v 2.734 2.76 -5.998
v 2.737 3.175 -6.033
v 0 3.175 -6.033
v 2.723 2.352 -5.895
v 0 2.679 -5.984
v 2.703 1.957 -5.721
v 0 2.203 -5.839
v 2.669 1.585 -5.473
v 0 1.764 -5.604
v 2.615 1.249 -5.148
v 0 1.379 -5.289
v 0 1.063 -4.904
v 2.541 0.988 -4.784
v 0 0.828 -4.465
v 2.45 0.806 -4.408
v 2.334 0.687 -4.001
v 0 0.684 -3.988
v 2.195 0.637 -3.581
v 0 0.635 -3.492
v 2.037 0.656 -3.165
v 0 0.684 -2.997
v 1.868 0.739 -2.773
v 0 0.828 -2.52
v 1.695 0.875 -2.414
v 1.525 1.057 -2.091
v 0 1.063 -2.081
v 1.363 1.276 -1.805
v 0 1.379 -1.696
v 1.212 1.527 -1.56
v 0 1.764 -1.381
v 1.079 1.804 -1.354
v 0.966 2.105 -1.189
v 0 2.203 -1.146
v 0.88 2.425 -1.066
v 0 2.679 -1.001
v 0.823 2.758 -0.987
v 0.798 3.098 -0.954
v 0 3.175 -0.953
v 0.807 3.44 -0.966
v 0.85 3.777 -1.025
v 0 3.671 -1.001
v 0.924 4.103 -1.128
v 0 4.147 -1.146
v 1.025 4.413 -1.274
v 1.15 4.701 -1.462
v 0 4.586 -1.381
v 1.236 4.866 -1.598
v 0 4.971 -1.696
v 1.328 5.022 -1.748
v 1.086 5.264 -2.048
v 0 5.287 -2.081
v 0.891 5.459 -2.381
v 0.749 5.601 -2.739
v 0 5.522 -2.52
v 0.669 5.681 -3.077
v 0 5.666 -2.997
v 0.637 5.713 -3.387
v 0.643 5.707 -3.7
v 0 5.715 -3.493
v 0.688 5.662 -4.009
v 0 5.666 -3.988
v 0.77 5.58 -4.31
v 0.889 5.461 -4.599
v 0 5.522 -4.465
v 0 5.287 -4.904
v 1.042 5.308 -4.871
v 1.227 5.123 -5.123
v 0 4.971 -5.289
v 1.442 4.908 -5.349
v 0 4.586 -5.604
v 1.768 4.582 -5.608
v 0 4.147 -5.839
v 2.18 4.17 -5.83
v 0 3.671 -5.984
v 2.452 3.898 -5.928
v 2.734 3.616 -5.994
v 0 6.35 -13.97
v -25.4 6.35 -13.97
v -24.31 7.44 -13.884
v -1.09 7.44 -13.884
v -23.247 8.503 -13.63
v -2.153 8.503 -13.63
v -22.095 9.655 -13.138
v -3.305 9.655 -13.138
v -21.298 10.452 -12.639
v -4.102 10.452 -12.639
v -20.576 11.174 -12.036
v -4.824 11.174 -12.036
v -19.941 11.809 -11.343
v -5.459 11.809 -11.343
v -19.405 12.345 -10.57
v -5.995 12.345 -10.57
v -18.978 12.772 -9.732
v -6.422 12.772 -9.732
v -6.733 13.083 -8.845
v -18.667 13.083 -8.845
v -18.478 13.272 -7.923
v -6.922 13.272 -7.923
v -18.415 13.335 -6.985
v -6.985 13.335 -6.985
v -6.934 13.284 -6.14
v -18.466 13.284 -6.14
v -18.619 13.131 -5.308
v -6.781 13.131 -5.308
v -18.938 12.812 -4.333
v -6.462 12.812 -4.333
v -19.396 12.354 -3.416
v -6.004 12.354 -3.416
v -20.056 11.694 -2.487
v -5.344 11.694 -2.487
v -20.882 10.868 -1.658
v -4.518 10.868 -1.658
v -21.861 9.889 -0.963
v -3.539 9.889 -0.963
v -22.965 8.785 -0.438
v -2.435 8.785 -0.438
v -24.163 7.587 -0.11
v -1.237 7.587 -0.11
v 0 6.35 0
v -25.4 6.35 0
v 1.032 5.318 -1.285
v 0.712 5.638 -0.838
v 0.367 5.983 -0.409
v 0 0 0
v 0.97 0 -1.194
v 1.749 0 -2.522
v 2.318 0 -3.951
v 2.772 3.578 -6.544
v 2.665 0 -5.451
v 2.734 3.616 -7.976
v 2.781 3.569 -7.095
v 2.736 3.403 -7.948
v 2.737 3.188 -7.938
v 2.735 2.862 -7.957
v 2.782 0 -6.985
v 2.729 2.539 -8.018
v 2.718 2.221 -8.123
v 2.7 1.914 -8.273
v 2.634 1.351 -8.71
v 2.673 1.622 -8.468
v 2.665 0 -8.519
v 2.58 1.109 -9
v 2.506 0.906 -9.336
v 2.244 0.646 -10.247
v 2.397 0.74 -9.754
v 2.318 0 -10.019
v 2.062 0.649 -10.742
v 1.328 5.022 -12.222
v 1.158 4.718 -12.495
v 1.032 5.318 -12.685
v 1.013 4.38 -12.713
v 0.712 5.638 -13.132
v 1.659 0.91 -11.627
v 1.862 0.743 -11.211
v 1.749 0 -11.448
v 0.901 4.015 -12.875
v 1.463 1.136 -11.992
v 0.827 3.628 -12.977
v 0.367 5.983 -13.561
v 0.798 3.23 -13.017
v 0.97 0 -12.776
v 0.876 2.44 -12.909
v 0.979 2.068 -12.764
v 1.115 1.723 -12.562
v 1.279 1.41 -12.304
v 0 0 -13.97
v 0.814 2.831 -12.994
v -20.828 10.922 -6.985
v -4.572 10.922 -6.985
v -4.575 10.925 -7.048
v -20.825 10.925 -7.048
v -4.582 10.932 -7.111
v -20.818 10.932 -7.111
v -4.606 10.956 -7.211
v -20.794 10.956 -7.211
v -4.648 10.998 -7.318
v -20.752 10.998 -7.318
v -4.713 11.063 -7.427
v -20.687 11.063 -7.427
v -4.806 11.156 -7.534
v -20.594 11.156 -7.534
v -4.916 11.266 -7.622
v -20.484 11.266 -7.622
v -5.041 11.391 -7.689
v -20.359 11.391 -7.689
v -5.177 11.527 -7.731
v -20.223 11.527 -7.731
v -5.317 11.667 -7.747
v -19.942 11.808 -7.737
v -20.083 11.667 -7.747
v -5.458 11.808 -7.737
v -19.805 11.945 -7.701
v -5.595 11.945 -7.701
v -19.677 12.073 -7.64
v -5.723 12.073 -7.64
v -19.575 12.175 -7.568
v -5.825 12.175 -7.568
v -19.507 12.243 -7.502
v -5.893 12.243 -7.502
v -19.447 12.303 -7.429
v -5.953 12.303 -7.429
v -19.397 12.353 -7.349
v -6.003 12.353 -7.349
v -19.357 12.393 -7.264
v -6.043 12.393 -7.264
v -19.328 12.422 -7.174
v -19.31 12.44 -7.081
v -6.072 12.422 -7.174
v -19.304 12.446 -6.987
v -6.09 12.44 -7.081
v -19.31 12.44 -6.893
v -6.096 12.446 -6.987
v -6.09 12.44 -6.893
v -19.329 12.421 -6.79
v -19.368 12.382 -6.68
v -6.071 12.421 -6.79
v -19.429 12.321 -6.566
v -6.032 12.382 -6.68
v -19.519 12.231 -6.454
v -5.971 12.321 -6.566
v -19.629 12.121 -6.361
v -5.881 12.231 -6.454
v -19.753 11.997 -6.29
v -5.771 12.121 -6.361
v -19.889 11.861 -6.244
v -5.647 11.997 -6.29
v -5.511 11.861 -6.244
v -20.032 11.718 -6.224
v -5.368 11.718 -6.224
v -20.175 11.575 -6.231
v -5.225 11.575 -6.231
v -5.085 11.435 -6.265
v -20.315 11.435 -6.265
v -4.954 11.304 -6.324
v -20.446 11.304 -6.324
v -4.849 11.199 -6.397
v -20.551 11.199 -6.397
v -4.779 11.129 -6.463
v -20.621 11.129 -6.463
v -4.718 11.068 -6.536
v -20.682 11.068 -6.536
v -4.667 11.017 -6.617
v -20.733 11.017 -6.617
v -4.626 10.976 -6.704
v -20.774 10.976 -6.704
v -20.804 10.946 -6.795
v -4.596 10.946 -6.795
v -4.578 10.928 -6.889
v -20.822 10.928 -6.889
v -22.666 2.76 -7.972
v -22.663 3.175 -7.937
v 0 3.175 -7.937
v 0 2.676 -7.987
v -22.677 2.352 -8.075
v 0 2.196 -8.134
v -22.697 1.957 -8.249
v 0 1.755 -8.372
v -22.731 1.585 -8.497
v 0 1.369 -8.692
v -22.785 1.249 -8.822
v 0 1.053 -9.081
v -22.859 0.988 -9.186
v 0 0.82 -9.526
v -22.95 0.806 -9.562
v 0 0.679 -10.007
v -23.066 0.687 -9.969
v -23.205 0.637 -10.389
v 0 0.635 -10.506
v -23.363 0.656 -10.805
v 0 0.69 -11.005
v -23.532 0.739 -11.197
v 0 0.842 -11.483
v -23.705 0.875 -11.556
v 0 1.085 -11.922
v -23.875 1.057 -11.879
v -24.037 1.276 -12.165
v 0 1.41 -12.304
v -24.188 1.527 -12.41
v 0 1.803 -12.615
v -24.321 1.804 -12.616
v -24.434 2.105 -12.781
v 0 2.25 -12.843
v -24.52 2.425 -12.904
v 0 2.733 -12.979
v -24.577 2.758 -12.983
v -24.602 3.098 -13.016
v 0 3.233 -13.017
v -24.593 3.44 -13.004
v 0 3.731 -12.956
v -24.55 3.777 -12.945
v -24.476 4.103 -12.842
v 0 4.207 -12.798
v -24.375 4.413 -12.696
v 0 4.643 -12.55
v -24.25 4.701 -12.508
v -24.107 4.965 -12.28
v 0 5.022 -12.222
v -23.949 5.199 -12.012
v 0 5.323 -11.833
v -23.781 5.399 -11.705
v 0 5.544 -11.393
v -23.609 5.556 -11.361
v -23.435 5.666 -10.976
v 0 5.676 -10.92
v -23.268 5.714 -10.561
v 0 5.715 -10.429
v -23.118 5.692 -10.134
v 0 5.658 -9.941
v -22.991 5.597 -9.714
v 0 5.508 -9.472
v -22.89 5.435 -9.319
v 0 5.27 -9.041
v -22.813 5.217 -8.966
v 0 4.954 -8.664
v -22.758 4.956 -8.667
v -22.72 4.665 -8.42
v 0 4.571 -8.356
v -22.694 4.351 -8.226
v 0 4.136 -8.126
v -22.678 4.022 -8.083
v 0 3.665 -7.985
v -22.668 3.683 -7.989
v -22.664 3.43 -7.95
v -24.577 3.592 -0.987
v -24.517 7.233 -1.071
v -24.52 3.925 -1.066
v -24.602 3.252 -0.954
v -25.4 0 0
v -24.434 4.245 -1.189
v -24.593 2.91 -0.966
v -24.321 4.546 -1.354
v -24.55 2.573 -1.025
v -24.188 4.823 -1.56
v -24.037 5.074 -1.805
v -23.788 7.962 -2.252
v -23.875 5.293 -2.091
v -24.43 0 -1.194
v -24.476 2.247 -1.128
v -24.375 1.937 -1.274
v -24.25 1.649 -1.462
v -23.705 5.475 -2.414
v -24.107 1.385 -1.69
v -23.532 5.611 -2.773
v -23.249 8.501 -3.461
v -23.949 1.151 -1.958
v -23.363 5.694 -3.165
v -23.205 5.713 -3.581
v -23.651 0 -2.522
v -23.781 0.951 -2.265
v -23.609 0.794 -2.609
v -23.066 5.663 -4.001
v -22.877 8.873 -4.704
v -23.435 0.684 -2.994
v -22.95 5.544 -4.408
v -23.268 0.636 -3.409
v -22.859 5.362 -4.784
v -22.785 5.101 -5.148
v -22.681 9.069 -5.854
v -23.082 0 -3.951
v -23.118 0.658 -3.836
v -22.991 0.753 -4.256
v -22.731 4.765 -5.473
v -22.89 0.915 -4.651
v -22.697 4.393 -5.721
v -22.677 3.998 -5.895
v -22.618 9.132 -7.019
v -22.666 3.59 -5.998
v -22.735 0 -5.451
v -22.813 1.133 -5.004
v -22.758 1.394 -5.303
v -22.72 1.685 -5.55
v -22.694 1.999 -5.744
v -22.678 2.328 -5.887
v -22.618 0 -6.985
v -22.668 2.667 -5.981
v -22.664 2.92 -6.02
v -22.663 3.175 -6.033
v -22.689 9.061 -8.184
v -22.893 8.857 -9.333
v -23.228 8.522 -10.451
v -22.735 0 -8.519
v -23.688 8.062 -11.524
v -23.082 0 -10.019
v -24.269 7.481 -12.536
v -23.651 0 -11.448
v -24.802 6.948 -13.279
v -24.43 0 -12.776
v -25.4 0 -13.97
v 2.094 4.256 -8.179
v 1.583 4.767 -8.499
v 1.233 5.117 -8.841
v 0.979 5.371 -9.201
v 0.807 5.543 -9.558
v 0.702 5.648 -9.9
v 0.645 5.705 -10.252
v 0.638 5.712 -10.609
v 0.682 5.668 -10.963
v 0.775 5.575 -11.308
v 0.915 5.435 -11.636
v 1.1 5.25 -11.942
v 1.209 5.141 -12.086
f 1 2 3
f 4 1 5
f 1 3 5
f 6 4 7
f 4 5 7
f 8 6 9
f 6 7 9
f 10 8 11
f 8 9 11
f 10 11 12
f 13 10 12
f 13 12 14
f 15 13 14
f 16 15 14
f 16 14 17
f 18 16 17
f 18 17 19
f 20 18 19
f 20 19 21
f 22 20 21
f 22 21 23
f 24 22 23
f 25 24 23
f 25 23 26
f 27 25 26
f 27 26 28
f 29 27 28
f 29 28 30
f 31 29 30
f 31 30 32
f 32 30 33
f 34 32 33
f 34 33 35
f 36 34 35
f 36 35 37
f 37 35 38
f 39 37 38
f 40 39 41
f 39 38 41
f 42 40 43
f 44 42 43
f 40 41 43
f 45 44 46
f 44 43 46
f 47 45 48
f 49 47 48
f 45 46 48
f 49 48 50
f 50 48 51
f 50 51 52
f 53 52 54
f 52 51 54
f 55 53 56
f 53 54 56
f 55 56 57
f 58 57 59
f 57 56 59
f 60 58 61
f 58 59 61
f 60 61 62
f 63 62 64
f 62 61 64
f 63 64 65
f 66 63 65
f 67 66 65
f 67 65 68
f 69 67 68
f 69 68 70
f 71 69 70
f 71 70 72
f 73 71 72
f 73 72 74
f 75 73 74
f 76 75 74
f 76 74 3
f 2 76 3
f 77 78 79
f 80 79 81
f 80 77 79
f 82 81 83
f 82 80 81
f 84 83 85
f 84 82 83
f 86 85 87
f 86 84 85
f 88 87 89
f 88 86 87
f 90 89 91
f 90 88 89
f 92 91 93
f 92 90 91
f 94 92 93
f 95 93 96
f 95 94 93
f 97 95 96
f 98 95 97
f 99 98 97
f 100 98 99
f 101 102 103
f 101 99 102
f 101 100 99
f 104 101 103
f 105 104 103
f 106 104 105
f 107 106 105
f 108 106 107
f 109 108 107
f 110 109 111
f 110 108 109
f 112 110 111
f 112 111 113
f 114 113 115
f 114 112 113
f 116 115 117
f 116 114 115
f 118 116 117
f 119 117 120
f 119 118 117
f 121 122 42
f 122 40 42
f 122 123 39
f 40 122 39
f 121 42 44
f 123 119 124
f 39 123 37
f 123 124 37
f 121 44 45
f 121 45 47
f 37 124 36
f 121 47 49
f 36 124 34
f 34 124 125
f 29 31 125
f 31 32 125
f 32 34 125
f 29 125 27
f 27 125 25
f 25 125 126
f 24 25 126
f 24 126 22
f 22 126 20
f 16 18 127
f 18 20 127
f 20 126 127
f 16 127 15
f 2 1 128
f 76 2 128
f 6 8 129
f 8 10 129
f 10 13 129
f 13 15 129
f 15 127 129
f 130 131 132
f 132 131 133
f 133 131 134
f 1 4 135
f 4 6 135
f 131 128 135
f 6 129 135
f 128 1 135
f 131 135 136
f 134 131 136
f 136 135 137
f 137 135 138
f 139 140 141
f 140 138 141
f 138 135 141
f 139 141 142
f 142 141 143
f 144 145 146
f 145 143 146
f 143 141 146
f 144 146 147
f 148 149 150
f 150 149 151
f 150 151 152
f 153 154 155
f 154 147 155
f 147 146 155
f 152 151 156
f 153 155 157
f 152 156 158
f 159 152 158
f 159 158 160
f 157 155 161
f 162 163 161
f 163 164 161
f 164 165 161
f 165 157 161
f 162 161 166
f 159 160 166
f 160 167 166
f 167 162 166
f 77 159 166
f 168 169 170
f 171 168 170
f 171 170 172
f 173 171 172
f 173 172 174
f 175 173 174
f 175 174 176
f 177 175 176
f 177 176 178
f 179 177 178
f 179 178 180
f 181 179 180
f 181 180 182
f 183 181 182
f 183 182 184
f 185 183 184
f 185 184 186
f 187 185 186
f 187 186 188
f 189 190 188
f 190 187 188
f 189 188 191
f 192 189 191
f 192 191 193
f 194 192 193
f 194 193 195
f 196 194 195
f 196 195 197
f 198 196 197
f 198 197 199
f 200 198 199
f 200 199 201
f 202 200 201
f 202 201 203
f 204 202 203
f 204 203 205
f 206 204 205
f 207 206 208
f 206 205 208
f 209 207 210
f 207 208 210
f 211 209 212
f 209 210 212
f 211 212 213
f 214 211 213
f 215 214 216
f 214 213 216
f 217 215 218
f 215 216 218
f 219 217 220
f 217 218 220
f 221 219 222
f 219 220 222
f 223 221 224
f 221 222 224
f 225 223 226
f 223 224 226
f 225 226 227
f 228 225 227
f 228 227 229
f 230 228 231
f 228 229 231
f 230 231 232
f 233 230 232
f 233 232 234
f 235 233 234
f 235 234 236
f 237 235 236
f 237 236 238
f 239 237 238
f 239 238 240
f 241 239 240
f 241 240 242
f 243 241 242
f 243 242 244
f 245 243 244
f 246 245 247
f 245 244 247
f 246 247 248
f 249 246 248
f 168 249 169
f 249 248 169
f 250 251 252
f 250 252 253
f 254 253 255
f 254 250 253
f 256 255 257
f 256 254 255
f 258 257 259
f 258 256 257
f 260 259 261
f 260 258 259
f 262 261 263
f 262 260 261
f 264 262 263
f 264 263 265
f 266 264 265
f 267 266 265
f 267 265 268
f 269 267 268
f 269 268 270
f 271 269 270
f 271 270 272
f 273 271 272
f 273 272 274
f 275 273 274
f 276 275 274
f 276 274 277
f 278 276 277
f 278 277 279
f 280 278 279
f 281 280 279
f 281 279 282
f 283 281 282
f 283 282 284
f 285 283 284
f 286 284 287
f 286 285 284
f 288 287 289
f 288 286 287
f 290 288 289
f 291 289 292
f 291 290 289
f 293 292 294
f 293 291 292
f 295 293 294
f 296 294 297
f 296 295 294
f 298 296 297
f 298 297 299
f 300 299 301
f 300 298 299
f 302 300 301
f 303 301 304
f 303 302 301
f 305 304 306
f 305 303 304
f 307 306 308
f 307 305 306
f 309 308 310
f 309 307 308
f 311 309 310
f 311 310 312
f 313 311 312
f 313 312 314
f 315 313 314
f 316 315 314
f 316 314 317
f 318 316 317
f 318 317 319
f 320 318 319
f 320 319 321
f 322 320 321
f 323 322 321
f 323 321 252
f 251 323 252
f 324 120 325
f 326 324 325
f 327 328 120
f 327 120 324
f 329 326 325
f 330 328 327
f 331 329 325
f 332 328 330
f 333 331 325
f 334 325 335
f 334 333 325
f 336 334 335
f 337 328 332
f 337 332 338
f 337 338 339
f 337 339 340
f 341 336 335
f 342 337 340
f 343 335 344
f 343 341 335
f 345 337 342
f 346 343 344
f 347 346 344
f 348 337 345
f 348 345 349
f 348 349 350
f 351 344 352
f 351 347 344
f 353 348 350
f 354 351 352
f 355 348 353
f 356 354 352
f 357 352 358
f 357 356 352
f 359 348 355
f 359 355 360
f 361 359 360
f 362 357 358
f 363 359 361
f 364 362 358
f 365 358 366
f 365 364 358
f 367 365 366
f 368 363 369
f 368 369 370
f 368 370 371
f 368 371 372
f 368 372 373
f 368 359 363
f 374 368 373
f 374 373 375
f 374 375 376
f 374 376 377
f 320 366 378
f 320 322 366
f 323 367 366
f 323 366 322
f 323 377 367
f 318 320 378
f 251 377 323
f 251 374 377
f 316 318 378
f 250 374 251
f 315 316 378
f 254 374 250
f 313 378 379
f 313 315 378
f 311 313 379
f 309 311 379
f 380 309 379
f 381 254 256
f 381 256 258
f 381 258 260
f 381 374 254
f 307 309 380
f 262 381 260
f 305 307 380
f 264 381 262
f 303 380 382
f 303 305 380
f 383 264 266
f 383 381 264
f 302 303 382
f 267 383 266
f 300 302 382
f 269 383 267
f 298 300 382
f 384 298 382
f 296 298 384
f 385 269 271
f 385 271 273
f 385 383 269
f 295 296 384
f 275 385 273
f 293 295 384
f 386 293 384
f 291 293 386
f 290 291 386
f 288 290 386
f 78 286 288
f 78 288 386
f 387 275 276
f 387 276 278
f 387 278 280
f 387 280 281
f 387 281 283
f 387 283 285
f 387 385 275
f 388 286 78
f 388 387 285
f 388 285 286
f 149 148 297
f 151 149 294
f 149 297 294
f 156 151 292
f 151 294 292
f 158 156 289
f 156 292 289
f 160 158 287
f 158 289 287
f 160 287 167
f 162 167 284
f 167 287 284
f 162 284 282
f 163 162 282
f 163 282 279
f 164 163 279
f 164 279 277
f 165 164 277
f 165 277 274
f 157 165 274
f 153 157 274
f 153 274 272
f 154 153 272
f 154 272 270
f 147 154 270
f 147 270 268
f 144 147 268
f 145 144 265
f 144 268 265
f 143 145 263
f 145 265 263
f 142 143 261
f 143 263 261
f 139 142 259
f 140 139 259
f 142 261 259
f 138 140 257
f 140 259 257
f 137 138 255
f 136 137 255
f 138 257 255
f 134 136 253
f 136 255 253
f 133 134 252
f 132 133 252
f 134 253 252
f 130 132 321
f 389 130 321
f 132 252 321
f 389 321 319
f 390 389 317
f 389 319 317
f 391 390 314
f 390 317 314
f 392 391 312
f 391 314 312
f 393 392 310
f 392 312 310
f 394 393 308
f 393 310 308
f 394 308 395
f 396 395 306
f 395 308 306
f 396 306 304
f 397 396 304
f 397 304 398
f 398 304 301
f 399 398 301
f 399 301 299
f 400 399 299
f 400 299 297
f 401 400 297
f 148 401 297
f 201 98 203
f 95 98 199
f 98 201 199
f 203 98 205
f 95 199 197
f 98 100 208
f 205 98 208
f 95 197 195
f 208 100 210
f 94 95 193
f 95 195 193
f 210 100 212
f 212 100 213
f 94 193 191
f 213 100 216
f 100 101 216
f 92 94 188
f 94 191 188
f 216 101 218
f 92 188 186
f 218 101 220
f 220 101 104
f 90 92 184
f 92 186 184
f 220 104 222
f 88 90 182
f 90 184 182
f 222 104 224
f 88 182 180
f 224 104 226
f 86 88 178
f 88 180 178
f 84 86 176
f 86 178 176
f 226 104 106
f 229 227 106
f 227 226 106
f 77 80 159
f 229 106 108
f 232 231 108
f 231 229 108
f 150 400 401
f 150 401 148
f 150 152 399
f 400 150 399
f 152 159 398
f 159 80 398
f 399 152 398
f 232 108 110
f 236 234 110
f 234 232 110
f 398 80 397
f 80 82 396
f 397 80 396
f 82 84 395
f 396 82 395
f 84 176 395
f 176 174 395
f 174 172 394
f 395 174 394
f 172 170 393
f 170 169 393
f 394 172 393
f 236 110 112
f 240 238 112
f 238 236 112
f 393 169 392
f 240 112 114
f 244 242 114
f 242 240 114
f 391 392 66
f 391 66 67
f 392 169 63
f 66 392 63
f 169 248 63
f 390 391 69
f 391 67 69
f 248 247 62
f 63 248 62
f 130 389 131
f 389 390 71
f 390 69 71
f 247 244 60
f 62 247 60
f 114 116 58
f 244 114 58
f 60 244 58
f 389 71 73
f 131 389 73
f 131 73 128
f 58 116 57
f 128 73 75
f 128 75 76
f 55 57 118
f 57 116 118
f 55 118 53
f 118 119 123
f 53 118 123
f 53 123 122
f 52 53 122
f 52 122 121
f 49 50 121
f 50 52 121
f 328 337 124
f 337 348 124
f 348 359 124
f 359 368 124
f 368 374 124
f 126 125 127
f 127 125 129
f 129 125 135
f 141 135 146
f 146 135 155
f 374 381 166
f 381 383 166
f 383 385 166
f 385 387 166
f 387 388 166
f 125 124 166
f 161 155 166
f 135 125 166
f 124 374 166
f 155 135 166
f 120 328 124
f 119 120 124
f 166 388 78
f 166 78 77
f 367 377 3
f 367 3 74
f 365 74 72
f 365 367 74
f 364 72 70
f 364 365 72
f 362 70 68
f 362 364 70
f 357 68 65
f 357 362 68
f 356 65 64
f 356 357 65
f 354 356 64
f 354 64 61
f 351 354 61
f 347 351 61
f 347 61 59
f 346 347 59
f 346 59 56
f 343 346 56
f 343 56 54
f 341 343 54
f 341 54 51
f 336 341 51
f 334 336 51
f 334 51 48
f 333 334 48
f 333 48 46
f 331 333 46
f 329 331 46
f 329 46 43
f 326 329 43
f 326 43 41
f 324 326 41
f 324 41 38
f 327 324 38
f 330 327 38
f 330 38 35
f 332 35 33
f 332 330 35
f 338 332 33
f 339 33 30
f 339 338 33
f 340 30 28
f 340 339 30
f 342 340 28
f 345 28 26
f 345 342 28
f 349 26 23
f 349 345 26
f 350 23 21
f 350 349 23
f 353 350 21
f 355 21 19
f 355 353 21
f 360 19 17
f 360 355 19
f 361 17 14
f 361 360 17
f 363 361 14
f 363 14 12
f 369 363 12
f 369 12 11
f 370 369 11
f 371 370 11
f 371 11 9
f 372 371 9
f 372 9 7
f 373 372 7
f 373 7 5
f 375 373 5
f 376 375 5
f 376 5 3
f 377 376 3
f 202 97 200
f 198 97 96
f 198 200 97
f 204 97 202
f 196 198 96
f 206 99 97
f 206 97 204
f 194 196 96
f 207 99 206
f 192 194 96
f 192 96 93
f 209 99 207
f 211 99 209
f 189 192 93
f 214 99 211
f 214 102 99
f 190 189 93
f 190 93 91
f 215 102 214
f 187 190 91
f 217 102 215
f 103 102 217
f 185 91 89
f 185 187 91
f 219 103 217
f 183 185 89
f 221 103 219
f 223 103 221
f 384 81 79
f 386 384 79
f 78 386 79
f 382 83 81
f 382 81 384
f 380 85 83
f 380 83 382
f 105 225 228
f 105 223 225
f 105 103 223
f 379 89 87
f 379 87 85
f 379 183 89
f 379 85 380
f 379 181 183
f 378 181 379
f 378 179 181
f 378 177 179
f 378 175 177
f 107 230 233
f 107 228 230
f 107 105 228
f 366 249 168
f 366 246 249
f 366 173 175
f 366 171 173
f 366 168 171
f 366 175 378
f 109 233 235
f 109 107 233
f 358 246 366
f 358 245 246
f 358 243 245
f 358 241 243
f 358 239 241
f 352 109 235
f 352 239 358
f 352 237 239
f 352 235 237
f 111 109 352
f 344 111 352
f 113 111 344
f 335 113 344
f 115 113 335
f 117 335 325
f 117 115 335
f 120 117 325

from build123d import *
from build123d.topology import SkipClean

# Parameters (mm, degrees)
SKETCH1_W                             = 25.4
SKETCH1_H                             = 13.97
DEPTH_A_DEPTH                         = 6.35
ROUND_EXTRUDE_DEPTH                   = 25.4
ANGLE_CUT_DEPTH                       = 32.908355097
STRING_HOLE_R                         = 0.762
STRING_HOLE_CUT_DEPTH                 = 32.908355097
ELASTIC_HOLE_CUT_DEPTH                = 32.908355097
ELASTIC_HOLE_CUT_DEPTH_BACK           = 32.908355097
ELASTIC_HOLES_R                       = 2.54
GUIDE_OUTIE_EXTRUDE_REACH             = 33.908
SKETCH7_R                             = 2.54
ELASTIC_HOLE_CUT_ON_GUIDE_OUTIE_DEPTH = 32.908355097
GUIDE_INNIE_CUT_DEPTH                 = 32.908355141


with BuildPart() as part:
    # Sketch1 → depth a (new body)
    with BuildSketch(Plane(origin=(0, 0, 0), x_dir=(1, 0, 0), z_dir=(0, 1, 0))):
        with Locations((-12.7, 6.985)):
            Rectangle(SKETCH1_W, SKETCH1_H)
    extrude(amount=DEPTH_A_DEPTH)

    # Sketch4 → round extrude (add)
    with BuildSketch(Plane(origin=(0, 0, 0), x_dir=(0, 0, -1), z_dir=(1, 0, 0))):
        with BuildLine():
            Line((0, 6.35), (13.97, 6.35))
            ThreePointArc((13.97, 6.35), (6.985, 13.335), (0, 6.35))
        make_face()
    extrude(amount=-ROUND_EXTRUDE_DEPTH)

    # Sketch5 → angle cut (cut, through all)
    with BuildSketch(Plane.XY):
        Polygon((0, 6.35), (0, 13.335), (-6.985, 13.335), align=None)
        Polygon((-25.4, 6.35), (-25.4, 13.335), (-18.415, 13.335), align=None)
    extrude(amount=-ANGLE_CUT_DEPTH, mode=Mode.SUBTRACT)

    # string hole → string hole cut (cut, through all)
    with BuildSketch(Plane(origin=(0, 0, 0), x_dir=(0, 0, -1), z_dir=(1, 0, 0))):
        with Locations(Location((6.985, 11.684, 0), (0, 0, 270))):
            Circle(STRING_HOLE_R)
    extrude(amount=-STRING_HOLE_CUT_DEPTH, mode=Mode.SUBTRACT)

    # elastic holes → elastic hole cut (cut, two sides: drawn at the far end of the back side and taken through both)
    with BuildSketch(Plane(origin=(0, 0, 0), x_dir=(0, 0, -1), z_dir=(1, 0, 0)).offset(-ELASTIC_HOLE_CUT_DEPTH_BACK)):
        with Locations((3.4925, 3.175)):
            Circle(ELASTIC_HOLES_R)
        with Locations(Location((10.4775, 3.175, 0), (0, 0, 180))):
            Circle(ELASTIC_HOLES_R)
    extrude(amount=ELASTIC_HOLE_CUT_DEPTH + ELASTIC_HOLE_CUT_DEPTH_BACK, mode=Mode.SUBTRACT)

    # guide outie extrude: up to this plane
    guide_outie_extrude_end = Plane(origin=(-6.985, 13.335, -13.97), z_dir=(-0.7071067811865512, -0.7071067811865439, 0))
    # guide outie → guide outie extrude (add, up to the surface)
    with BuildSketch(Plane(origin=(0, 0, 0), x_dir=(1, 0, 0), z_dir=(0, 1, 0)), mode=Mode.PRIVATE) as guide_outie_extrude_sk1:
        with BuildLine():
            Line((0, 13.97), (0, 0))
            ThreePointArc((0, 0), (2.781966725, 6.985), (0, 13.97))
        make_face()
    guide_outie_extrude_tool1 = split(extrude(guide_outie_extrude_sk1.sketch, amount=GUIDE_OUTIE_EXTRUDE_REACH, mode=Mode.PRIVATE), bisect_by=guide_outie_extrude_end, keep=Keep.BOTH, mode=Mode.PRIVATE)
    add(guide_outie_extrude_tool1.solids().sort_by_distance((1.126975, 0, -6.985))[0])

    # Sketch7 → elastic hole cut on guide outie (cut, through all)
    with SkipClean():  # the faces are left unmerged after this step: merging them gives an invalid solid
        with BuildSketch(Plane.ZY):
            with Locations(Location((-3.4925, 3.175, 0), (0, 0, 180))):
                Circle(SKETCH7_R)
            with Locations(Location((-10.4775, 3.175, 0), (0, 0, 133.366502627))):
                Circle(SKETCH7_R)
        extrude(amount=-ELASTIC_HOLE_CUT_ON_GUIDE_OUTIE_DEPTH, mode=Mode.SUBTRACT)

    # guide innie → guide innie cut (cut, through all)
    with SkipClean():  # the faces are left unmerged after this step: merging them gives an invalid solid
        with BuildSketch(Plane(origin=(0, 0, 0), x_dir=(1, 0, 0), z_dir=(0, 1, 0))):
            with BuildLine():
                Line((-25.4, 13.97), (-25.4, 0))
                ThreePointArc((-25.4, 0), (-22.618033275, 6.985), (-25.4, 13.97))
            make_face()
        extrude(amount=GUIDE_INNIE_CUT_DEPTH, mode=Mode.SUBTRACT)


solid = part.part
